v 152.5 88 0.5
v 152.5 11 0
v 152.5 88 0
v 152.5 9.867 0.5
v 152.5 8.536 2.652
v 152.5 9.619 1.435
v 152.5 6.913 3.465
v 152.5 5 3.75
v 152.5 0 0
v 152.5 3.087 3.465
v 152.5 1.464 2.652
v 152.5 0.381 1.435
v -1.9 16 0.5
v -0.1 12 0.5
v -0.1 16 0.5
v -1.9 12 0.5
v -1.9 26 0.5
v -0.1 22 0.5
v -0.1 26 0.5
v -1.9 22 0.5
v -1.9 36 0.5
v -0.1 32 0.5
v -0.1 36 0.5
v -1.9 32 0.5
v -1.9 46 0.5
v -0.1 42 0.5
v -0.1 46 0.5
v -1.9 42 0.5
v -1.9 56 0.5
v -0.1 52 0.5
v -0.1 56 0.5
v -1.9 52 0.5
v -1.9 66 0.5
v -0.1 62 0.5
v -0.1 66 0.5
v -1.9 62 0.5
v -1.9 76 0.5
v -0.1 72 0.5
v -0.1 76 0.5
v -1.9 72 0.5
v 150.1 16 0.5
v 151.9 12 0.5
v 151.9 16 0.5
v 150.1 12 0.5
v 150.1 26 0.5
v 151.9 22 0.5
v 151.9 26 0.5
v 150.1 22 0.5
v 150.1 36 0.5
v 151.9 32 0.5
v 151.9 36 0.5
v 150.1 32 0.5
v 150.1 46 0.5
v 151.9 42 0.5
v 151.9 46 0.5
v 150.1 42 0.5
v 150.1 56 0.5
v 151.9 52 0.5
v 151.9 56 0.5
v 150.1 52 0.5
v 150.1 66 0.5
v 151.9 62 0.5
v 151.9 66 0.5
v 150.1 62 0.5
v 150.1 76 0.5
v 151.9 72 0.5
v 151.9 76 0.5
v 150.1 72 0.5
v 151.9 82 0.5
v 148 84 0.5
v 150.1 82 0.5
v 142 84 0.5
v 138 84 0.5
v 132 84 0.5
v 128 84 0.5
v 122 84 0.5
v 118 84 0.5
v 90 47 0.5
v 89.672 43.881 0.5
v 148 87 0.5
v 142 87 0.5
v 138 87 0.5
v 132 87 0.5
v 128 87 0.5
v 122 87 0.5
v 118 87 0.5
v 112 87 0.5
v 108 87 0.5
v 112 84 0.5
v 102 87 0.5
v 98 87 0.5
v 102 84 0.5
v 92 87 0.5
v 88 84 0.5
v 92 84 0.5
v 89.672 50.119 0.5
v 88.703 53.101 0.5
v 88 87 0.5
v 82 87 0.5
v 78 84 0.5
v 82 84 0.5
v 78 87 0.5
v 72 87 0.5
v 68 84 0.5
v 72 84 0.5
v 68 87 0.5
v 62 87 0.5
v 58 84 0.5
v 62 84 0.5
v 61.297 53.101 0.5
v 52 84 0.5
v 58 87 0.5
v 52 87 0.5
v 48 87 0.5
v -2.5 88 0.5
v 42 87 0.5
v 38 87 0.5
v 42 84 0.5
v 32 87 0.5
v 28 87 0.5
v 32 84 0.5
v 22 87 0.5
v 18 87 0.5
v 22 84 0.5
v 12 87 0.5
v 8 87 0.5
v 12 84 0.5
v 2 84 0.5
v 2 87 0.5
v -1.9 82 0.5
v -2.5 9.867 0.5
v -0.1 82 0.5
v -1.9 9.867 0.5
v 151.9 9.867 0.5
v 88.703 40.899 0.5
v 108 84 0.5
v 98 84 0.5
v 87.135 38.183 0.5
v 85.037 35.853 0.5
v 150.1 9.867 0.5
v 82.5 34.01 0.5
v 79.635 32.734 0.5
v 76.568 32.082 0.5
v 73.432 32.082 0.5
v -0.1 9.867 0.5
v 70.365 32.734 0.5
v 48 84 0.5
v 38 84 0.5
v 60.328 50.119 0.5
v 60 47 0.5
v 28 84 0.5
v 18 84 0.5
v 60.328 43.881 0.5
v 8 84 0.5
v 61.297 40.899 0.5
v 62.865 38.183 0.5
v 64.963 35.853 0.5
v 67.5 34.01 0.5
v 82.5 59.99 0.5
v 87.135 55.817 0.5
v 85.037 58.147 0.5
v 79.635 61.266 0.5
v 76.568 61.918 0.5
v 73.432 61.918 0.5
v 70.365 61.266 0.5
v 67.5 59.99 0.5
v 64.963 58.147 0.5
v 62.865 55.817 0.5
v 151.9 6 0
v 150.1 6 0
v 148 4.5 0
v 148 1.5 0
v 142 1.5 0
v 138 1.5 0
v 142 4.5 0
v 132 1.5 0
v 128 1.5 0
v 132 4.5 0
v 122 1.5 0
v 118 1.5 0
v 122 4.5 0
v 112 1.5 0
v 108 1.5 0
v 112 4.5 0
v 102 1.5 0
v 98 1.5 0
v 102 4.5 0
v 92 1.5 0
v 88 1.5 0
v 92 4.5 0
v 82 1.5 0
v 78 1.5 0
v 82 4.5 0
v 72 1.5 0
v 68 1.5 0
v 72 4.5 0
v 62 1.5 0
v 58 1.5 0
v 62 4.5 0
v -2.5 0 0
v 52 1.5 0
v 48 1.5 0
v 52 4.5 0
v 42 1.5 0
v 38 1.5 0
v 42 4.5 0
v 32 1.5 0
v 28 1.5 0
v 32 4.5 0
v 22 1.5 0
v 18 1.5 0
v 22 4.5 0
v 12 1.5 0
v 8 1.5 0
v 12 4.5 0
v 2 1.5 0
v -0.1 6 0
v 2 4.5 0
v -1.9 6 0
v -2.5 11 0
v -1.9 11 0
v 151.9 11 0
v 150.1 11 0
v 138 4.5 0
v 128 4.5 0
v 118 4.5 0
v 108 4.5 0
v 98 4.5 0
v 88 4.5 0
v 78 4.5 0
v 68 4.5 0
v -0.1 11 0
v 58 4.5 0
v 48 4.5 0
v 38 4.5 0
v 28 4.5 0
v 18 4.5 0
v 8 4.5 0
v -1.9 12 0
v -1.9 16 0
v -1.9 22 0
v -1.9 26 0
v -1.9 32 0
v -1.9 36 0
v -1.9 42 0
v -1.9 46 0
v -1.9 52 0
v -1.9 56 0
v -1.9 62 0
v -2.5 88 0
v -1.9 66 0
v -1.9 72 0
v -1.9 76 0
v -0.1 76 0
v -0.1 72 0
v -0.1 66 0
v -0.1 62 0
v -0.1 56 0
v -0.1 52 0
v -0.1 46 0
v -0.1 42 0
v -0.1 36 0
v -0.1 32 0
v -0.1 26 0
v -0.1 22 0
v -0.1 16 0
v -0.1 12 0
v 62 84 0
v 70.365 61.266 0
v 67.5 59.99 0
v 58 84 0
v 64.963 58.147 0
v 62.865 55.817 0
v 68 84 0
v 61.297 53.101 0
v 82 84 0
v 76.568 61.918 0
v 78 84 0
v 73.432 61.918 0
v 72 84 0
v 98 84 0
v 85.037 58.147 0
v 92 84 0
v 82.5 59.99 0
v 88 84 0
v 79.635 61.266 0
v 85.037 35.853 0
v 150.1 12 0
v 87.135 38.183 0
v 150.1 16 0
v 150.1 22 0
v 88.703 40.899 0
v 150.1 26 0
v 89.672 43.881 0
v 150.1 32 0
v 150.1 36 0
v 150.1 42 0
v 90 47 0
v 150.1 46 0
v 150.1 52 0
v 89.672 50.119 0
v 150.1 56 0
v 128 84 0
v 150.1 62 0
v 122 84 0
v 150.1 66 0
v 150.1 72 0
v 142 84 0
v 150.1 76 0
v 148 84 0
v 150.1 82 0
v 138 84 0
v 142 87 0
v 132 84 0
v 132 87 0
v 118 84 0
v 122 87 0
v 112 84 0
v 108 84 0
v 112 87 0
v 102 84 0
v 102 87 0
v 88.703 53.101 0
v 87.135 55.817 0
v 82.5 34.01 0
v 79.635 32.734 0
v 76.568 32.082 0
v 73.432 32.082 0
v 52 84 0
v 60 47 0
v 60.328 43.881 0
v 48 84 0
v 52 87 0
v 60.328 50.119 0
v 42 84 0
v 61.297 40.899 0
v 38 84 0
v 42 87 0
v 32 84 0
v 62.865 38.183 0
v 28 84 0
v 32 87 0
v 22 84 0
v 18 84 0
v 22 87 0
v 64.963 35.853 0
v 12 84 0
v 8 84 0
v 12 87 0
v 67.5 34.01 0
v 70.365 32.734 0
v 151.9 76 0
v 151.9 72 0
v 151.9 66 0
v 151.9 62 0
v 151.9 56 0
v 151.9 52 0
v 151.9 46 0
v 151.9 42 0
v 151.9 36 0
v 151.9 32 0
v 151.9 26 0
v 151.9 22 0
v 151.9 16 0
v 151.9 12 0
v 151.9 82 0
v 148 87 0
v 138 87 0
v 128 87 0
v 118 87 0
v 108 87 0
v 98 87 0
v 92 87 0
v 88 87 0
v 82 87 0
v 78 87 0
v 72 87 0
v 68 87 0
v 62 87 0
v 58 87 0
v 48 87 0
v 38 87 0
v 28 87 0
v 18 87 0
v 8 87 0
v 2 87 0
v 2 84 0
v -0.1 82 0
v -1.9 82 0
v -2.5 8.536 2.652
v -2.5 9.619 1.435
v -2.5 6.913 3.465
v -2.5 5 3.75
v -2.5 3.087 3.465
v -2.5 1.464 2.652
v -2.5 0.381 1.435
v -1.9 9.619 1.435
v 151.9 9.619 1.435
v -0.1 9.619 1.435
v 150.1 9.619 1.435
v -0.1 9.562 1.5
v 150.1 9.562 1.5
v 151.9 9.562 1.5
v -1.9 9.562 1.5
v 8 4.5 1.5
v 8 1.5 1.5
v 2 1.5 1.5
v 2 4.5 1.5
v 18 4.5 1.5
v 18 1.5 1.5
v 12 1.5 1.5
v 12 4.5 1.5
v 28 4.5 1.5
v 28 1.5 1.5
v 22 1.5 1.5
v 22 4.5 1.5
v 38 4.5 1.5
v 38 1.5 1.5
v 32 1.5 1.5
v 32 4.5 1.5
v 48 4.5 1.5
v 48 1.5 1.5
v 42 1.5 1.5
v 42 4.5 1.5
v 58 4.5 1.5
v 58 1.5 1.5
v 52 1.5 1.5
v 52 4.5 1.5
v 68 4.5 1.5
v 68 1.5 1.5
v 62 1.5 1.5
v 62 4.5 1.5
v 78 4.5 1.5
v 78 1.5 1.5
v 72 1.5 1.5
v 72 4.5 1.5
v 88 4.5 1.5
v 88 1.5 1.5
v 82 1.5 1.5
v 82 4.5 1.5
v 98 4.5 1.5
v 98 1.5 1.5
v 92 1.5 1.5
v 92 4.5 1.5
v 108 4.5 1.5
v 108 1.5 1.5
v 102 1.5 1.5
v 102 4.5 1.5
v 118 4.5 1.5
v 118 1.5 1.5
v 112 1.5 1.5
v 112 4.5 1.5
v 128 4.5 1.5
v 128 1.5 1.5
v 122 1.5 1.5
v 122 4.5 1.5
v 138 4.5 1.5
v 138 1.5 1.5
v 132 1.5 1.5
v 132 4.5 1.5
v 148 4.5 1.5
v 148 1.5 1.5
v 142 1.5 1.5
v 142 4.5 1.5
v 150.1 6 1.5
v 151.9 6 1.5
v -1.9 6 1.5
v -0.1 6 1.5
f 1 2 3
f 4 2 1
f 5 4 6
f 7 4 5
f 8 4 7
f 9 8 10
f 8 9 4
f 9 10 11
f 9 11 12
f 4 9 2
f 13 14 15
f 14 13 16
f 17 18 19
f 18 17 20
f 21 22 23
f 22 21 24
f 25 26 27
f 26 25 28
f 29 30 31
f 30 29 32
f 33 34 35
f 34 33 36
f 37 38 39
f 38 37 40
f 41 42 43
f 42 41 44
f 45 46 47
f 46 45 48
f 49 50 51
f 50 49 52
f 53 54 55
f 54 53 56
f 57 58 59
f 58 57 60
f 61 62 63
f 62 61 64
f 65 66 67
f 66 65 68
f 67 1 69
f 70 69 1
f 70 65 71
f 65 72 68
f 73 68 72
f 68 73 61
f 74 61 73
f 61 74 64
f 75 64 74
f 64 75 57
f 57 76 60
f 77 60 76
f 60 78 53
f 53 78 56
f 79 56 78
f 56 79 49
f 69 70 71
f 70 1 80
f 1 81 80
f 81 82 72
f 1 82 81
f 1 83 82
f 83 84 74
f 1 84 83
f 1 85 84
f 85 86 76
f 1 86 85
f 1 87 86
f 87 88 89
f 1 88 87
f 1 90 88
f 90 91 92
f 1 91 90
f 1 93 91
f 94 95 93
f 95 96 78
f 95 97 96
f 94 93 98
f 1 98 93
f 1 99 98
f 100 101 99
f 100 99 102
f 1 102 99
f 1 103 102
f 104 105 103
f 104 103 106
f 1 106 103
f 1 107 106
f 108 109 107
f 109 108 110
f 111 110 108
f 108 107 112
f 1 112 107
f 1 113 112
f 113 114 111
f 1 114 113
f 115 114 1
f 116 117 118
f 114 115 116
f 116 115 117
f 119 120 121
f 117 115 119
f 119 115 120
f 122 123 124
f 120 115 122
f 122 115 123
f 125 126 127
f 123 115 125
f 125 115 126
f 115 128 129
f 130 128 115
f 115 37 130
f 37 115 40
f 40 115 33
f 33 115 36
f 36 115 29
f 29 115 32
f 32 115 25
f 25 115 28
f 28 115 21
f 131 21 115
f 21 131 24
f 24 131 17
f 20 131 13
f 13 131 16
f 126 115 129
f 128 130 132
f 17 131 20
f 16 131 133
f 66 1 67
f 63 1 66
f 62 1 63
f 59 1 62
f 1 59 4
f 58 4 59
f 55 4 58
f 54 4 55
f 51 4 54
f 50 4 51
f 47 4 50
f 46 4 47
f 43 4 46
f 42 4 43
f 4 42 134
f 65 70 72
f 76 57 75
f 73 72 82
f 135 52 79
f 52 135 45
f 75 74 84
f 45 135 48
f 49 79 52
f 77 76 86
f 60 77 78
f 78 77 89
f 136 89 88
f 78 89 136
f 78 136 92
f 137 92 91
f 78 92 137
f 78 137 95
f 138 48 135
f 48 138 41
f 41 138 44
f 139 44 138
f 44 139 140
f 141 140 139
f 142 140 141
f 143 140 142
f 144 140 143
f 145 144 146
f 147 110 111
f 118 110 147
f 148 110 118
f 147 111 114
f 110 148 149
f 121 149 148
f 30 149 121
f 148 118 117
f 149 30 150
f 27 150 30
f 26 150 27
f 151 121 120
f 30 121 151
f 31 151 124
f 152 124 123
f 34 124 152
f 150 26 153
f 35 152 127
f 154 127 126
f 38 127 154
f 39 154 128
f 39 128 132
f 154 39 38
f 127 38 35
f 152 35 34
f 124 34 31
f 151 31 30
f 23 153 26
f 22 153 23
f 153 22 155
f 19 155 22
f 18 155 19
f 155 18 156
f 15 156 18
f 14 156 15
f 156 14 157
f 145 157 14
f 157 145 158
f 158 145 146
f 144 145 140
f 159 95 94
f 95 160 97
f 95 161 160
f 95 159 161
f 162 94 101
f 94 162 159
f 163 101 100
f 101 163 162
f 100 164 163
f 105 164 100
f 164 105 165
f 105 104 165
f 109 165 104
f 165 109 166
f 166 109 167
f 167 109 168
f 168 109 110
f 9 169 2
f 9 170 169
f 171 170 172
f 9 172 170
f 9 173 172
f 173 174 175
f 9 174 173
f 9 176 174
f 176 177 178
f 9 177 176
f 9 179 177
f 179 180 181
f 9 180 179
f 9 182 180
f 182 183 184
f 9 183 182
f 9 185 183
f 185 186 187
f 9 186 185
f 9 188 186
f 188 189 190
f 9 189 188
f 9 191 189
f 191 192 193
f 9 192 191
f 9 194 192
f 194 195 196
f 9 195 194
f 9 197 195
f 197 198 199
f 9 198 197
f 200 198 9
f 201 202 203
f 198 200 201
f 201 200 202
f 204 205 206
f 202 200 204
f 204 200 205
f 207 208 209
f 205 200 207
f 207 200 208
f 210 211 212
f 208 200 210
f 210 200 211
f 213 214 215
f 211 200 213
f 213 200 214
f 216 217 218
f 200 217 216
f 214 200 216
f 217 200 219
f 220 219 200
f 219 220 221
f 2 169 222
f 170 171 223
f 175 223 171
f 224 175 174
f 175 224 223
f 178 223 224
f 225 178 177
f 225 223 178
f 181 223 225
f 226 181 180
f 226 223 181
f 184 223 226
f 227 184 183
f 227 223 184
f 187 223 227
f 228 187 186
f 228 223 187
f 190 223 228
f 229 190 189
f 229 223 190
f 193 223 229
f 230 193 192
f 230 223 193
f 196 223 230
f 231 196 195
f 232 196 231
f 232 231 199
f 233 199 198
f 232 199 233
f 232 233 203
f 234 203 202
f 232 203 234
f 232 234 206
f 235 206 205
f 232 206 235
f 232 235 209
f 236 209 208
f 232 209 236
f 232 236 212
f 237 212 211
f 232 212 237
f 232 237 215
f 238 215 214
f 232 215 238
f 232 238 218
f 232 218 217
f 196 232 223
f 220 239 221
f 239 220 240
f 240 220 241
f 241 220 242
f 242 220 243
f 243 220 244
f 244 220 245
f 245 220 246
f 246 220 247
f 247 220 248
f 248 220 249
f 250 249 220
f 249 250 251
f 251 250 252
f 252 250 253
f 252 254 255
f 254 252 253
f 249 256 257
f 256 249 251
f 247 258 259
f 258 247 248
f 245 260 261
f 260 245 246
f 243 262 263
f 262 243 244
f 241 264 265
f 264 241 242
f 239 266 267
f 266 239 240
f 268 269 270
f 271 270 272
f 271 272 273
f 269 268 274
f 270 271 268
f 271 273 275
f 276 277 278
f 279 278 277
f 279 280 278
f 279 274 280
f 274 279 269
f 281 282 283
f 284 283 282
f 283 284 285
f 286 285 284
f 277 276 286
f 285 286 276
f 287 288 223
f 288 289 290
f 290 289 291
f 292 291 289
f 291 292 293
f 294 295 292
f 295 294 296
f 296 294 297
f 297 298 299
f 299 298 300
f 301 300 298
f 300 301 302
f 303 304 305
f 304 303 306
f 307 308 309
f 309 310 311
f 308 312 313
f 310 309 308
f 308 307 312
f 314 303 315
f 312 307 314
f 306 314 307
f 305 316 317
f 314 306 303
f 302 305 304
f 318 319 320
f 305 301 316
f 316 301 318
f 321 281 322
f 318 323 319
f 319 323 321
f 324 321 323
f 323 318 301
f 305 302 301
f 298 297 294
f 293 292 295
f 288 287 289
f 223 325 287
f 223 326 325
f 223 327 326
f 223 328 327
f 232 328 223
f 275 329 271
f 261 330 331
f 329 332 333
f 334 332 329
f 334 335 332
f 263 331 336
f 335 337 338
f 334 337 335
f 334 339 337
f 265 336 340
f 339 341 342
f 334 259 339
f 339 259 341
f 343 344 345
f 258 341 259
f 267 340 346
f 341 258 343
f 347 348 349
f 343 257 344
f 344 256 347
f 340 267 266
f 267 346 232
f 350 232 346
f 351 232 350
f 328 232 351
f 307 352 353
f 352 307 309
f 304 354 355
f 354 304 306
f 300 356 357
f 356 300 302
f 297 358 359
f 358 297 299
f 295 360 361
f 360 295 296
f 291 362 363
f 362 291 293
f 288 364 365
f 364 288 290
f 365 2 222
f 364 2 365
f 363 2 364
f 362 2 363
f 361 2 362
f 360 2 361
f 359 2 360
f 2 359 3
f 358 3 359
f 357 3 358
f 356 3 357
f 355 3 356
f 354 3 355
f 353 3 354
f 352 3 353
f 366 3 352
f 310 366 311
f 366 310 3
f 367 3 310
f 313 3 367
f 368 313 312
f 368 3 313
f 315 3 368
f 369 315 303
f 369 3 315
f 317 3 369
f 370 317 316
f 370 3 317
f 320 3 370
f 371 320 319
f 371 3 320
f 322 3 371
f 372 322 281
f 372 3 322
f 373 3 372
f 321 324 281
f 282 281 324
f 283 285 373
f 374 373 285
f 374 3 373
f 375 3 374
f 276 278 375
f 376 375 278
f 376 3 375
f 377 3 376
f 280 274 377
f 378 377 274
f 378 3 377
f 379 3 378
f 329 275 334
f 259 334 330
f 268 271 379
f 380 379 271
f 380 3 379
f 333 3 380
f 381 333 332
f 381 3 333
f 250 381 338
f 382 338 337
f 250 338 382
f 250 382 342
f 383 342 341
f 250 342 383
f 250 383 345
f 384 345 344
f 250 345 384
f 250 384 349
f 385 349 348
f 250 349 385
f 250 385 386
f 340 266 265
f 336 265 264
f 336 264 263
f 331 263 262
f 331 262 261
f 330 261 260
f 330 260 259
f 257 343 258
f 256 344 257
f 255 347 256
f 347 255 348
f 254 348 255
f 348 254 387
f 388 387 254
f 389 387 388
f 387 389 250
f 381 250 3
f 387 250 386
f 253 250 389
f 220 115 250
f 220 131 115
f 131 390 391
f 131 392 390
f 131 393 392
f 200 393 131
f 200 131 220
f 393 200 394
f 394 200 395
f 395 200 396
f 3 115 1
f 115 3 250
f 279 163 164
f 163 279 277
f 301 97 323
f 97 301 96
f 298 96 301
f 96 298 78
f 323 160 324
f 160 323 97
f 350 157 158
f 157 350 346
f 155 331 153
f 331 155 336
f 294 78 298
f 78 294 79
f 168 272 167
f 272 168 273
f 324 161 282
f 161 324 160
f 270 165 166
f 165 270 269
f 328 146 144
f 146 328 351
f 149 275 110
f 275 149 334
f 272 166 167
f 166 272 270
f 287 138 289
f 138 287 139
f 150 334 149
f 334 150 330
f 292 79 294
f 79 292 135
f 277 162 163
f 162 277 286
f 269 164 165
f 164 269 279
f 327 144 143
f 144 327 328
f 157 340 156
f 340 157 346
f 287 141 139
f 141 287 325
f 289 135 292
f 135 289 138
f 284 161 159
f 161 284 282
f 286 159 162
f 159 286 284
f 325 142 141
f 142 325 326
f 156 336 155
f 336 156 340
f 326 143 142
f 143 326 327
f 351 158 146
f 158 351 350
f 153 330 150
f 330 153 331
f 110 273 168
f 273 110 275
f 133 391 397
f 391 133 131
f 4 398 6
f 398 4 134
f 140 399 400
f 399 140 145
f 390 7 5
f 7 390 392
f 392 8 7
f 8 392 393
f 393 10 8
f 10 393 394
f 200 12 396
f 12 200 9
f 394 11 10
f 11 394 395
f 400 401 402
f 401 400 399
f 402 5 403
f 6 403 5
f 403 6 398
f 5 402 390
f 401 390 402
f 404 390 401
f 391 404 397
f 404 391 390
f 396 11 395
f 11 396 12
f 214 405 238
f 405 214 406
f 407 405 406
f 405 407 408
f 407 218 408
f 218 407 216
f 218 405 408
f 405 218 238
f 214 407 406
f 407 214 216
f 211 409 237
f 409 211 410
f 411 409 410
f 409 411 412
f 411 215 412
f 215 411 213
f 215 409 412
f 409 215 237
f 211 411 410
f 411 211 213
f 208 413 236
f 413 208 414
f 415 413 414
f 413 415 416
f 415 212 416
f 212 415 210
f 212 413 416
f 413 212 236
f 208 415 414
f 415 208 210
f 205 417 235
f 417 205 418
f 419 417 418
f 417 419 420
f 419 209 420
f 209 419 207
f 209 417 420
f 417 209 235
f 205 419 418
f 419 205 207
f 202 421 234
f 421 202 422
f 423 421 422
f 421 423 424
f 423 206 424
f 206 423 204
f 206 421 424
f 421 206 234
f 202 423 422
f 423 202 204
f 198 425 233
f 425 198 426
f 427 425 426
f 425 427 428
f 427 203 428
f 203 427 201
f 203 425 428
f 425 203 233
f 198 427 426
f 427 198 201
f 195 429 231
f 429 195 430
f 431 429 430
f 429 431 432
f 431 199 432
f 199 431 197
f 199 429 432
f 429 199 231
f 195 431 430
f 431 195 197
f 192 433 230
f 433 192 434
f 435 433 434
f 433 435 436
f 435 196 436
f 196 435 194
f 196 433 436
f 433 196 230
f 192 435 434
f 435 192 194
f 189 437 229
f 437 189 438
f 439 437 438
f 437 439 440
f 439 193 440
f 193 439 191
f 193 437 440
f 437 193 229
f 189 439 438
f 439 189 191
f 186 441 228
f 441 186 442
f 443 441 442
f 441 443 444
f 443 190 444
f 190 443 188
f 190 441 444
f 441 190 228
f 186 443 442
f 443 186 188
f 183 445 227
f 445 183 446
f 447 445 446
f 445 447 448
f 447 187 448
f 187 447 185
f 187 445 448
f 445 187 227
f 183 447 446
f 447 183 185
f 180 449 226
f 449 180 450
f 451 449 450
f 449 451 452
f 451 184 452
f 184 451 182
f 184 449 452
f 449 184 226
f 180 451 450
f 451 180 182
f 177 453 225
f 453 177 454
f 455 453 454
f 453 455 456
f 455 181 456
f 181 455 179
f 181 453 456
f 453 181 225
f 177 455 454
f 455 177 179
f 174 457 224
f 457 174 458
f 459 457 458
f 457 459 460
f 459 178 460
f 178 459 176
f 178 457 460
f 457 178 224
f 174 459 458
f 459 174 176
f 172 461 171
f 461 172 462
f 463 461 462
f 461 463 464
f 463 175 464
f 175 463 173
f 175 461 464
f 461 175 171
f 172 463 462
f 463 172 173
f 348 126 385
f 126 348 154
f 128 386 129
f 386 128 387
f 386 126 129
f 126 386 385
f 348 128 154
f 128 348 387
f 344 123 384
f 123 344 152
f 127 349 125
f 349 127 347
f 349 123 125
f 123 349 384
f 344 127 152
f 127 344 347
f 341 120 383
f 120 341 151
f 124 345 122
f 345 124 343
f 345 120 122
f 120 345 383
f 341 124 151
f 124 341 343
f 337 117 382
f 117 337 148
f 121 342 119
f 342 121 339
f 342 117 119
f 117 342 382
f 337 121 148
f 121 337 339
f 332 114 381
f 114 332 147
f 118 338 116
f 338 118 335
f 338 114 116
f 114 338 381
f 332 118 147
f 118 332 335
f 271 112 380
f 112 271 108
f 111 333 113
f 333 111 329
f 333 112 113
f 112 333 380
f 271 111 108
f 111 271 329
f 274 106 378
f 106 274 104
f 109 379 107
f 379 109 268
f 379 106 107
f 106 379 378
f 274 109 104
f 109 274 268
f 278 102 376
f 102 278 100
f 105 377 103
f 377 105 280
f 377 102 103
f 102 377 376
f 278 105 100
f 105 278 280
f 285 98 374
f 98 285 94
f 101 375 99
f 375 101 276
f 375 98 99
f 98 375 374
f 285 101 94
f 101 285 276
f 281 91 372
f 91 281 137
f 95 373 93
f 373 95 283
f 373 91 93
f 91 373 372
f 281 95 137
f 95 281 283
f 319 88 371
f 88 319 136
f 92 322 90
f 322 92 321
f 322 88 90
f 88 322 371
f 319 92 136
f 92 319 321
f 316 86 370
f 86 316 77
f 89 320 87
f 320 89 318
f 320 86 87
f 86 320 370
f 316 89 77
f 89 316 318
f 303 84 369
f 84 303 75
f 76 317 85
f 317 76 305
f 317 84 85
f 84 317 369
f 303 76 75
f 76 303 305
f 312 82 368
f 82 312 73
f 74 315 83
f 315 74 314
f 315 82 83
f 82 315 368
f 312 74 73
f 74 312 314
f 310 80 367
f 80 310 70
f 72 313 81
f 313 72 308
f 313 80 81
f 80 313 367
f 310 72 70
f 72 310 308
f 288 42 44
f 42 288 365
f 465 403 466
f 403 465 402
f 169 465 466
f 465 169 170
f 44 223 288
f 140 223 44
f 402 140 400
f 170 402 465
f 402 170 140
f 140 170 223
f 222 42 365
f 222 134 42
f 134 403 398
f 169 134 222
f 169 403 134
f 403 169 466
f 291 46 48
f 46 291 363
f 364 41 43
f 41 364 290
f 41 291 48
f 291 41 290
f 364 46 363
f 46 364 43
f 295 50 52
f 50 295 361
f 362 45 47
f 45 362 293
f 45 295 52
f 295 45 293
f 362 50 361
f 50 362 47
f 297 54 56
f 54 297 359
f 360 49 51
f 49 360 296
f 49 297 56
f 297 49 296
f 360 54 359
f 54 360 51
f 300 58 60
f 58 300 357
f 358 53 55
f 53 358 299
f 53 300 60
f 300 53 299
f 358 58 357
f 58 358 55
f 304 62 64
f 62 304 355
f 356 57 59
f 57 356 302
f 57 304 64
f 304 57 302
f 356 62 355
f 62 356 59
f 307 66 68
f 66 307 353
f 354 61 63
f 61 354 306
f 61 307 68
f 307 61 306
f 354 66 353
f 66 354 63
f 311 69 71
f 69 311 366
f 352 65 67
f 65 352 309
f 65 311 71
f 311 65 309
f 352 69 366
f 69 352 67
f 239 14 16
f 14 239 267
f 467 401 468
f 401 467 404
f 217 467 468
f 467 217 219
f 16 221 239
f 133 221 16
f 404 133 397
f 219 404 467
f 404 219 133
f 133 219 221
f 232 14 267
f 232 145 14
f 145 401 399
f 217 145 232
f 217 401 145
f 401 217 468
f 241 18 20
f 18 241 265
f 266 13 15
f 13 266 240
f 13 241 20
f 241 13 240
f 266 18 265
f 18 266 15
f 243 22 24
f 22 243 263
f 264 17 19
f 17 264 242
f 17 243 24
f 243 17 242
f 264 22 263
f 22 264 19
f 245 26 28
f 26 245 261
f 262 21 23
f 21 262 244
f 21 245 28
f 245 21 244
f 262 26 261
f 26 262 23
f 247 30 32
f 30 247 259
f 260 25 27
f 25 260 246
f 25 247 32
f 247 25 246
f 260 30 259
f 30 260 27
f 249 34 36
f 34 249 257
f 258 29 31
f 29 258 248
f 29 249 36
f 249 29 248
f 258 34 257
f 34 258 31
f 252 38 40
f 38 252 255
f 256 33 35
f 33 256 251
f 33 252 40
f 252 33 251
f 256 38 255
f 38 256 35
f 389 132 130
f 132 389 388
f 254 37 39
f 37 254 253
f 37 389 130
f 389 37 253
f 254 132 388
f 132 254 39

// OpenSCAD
// file: crystal.scad
module crystal() {
  smoothRad = 8;
  minkowski(){
    cylinder(h=55.8-smoothRad*2, r=28.5/2-smoothRad, center=true);
    sphere(r=smoothRad);
  }
}

// crystal();
// file: 8422.scad
module pin() {
  translate([11.1/2, 0,        0]) cylinder(h=6, r=0.5);
  translate([11.1/2, 4.3,      0]) cylinder(h=6, r=0.5);
  translate([0,      17.1/2,   0]) cylinder(h=6, r=0.5);
  translate([sin(26)*17.1/2, cos(26)*17.1/2, 0]) cylinder(h=6, r=0.5);
}

module nixie8422(){
  smoothRad = 7;
  union(){
    minkowski(){
      cube(size=[18.85-smoothRad*2, 25.1-smoothRad*2, 20-smoothRad*2], center=true);
      sphere(r=smoothRad);
    }
    translate([0,0,-15]) union(){
      pin();
      mirror([0,1,0]) pin();
      mirror([1,0,0]) pin();
      mirror([0,1,0]) mirror([1,0,0]) pin();
    }
  }
}
// main file
use <8422.scad>
use <crystal.scad>

// $fn=30;

tubeSpacing  = 10.5;
groupSpacing = 50.0;

module nixies( scaling ) {
  module tubeGroup() {
    translate([-tubeSpacing,0,0]) scale([scaling, scaling, scaling]) nixie8422();
    translate([ tubeSpacing,0,0]) scale([scaling, scaling, scaling]) nixie8422();
  }
  module colonGroup() {
    translate([0,5,5]) scale([scaling, scaling, scaling]) cylinder(h=20, r=3.2, center=true);
    translate([0,-5,5])scale([scaling, scaling, scaling]) cylinder(h=20, r=3.2, center=true);
  }
  union(){
    translate([0,0,0])              tubeGroup();
    translate([groupSpacing/2,0,0]) colonGroup();
    translate([groupSpacing,0,0])   tubeGroup();
    translate([-groupSpacing/2,0,0]) colonGroup();
    translate([-groupSpacing,0,0])  tubeGroup();
  }
}

// standoffs
module sOffs(){
  soDist = 3;
  translate([ 145/2-soDist, 40/2-soDist,-pcbDist+0.5]) cylinder(h=pcbDist, r=4);
  translate([-145/2+soDist,-40/2+soDist,-pcbDist+0.5]) cylinder(h=pcbDist, r=4);
  translate([-145/2+soDist, 40/2-soDist,-pcbDist+0.5]) cylinder(h=pcbDist, r=4);
  translate([ 145/2-soDist,-40/2+soDist,-pcbDist+0.5]) cylinder(h=pcbDist, r=4);
}

// the frontpanel
fpThickness = 10;
pcbDist = 12;
module panel() {
  difference(){
    cube(size=[150,45,fpThickness], center=true);
    nixies(1.06);
  }
  sOffs();
}

module drop() {
  difference(){
    union(){
      translate([-2.5,0,0]) cube(size=[155, 83, 0.5], center=false);
      translate([-2.5,0,0.5])
        scale([1.03333333,1.0,0.15])
          surface( file="./drop.png", center=false, convexity=0 );
    }
    translate([150/2,42,0]) cylinder(h=30, r=15, center=true);
  }
}

module frontPanel() {
  panel();
  // the pcb
  translate([0,0,-pcbDist]) color("darkgreen") cube(size=[144,39,1], center=true);
  // color("white") nixies( 1.0 );
}


!translate([0,0,0]) difference(){
  union(){
    translate([0,fpThickness/2,0]) drop();
    scale([1,1,0.75]) translate([75,fpThickness/2,0]) rotate([0,90,0]) cylinder(r=fpThickness/2, h=155, center=true);
  }
  union(){
    translate([-5,-1,-5]) cube(size=[160,12,5], center=false);
    translate([0,3,0]) teeth(1.0, 140);
    translate([0,85.5,0]) teeth(1.0, 140);
    translate([151.0,4,0]) scale([0.6,1,1]) rotate([0,0,90]) teeth(1, 70);
    translate([-1.0,4,0]) scale([0.6,1,1]) rotate([0,0,90]) teeth(1, 70);
  }
}
color("white") translate([0,fpThickness/2,0]) translate([150/2,42,22]) crystal();


// Frontpanel
// sidewalls
union(){
  translate([150/2,fpThickness/2,-45/2]) rotate([90,0,0]) frontPanel();
  translate([0,3,0]) teeth(0.98, 140);
  translate([-2.5,0,-45]) cube(size=[2.5,88,45], center=false);
  translate([150,0,-45]) cube(size=[2.5,88,45], center=false);
  translate([151.0,4,0]) scale([0.6,1,1]) rotate([0,0,90]) teeth(0.98, 70);
  translate([-2.5,0,-45-2.5]) cube(size=[155,88,2.5], center=false);
  translate([-1.0,4,0]) scale([0.6,1,1]) rotate([0,0,90]) teeth(0.98, 70);
  translate([150/2,88-fpThickness/4,-45/2]) rotate([90,0,0]) cube(size=[150,45,fpThickness/2], center=true);
  translate([0,85.5,0]) teeth(0.98, 140);
}
module teeth( scaleF, endLength=140 ){
  for ( xTooth = [0:10:endLength] ){
    translate([5+xTooth,0,0]) scale(scaleF) cube(size=[6,3,3], center=true);
  }
}
